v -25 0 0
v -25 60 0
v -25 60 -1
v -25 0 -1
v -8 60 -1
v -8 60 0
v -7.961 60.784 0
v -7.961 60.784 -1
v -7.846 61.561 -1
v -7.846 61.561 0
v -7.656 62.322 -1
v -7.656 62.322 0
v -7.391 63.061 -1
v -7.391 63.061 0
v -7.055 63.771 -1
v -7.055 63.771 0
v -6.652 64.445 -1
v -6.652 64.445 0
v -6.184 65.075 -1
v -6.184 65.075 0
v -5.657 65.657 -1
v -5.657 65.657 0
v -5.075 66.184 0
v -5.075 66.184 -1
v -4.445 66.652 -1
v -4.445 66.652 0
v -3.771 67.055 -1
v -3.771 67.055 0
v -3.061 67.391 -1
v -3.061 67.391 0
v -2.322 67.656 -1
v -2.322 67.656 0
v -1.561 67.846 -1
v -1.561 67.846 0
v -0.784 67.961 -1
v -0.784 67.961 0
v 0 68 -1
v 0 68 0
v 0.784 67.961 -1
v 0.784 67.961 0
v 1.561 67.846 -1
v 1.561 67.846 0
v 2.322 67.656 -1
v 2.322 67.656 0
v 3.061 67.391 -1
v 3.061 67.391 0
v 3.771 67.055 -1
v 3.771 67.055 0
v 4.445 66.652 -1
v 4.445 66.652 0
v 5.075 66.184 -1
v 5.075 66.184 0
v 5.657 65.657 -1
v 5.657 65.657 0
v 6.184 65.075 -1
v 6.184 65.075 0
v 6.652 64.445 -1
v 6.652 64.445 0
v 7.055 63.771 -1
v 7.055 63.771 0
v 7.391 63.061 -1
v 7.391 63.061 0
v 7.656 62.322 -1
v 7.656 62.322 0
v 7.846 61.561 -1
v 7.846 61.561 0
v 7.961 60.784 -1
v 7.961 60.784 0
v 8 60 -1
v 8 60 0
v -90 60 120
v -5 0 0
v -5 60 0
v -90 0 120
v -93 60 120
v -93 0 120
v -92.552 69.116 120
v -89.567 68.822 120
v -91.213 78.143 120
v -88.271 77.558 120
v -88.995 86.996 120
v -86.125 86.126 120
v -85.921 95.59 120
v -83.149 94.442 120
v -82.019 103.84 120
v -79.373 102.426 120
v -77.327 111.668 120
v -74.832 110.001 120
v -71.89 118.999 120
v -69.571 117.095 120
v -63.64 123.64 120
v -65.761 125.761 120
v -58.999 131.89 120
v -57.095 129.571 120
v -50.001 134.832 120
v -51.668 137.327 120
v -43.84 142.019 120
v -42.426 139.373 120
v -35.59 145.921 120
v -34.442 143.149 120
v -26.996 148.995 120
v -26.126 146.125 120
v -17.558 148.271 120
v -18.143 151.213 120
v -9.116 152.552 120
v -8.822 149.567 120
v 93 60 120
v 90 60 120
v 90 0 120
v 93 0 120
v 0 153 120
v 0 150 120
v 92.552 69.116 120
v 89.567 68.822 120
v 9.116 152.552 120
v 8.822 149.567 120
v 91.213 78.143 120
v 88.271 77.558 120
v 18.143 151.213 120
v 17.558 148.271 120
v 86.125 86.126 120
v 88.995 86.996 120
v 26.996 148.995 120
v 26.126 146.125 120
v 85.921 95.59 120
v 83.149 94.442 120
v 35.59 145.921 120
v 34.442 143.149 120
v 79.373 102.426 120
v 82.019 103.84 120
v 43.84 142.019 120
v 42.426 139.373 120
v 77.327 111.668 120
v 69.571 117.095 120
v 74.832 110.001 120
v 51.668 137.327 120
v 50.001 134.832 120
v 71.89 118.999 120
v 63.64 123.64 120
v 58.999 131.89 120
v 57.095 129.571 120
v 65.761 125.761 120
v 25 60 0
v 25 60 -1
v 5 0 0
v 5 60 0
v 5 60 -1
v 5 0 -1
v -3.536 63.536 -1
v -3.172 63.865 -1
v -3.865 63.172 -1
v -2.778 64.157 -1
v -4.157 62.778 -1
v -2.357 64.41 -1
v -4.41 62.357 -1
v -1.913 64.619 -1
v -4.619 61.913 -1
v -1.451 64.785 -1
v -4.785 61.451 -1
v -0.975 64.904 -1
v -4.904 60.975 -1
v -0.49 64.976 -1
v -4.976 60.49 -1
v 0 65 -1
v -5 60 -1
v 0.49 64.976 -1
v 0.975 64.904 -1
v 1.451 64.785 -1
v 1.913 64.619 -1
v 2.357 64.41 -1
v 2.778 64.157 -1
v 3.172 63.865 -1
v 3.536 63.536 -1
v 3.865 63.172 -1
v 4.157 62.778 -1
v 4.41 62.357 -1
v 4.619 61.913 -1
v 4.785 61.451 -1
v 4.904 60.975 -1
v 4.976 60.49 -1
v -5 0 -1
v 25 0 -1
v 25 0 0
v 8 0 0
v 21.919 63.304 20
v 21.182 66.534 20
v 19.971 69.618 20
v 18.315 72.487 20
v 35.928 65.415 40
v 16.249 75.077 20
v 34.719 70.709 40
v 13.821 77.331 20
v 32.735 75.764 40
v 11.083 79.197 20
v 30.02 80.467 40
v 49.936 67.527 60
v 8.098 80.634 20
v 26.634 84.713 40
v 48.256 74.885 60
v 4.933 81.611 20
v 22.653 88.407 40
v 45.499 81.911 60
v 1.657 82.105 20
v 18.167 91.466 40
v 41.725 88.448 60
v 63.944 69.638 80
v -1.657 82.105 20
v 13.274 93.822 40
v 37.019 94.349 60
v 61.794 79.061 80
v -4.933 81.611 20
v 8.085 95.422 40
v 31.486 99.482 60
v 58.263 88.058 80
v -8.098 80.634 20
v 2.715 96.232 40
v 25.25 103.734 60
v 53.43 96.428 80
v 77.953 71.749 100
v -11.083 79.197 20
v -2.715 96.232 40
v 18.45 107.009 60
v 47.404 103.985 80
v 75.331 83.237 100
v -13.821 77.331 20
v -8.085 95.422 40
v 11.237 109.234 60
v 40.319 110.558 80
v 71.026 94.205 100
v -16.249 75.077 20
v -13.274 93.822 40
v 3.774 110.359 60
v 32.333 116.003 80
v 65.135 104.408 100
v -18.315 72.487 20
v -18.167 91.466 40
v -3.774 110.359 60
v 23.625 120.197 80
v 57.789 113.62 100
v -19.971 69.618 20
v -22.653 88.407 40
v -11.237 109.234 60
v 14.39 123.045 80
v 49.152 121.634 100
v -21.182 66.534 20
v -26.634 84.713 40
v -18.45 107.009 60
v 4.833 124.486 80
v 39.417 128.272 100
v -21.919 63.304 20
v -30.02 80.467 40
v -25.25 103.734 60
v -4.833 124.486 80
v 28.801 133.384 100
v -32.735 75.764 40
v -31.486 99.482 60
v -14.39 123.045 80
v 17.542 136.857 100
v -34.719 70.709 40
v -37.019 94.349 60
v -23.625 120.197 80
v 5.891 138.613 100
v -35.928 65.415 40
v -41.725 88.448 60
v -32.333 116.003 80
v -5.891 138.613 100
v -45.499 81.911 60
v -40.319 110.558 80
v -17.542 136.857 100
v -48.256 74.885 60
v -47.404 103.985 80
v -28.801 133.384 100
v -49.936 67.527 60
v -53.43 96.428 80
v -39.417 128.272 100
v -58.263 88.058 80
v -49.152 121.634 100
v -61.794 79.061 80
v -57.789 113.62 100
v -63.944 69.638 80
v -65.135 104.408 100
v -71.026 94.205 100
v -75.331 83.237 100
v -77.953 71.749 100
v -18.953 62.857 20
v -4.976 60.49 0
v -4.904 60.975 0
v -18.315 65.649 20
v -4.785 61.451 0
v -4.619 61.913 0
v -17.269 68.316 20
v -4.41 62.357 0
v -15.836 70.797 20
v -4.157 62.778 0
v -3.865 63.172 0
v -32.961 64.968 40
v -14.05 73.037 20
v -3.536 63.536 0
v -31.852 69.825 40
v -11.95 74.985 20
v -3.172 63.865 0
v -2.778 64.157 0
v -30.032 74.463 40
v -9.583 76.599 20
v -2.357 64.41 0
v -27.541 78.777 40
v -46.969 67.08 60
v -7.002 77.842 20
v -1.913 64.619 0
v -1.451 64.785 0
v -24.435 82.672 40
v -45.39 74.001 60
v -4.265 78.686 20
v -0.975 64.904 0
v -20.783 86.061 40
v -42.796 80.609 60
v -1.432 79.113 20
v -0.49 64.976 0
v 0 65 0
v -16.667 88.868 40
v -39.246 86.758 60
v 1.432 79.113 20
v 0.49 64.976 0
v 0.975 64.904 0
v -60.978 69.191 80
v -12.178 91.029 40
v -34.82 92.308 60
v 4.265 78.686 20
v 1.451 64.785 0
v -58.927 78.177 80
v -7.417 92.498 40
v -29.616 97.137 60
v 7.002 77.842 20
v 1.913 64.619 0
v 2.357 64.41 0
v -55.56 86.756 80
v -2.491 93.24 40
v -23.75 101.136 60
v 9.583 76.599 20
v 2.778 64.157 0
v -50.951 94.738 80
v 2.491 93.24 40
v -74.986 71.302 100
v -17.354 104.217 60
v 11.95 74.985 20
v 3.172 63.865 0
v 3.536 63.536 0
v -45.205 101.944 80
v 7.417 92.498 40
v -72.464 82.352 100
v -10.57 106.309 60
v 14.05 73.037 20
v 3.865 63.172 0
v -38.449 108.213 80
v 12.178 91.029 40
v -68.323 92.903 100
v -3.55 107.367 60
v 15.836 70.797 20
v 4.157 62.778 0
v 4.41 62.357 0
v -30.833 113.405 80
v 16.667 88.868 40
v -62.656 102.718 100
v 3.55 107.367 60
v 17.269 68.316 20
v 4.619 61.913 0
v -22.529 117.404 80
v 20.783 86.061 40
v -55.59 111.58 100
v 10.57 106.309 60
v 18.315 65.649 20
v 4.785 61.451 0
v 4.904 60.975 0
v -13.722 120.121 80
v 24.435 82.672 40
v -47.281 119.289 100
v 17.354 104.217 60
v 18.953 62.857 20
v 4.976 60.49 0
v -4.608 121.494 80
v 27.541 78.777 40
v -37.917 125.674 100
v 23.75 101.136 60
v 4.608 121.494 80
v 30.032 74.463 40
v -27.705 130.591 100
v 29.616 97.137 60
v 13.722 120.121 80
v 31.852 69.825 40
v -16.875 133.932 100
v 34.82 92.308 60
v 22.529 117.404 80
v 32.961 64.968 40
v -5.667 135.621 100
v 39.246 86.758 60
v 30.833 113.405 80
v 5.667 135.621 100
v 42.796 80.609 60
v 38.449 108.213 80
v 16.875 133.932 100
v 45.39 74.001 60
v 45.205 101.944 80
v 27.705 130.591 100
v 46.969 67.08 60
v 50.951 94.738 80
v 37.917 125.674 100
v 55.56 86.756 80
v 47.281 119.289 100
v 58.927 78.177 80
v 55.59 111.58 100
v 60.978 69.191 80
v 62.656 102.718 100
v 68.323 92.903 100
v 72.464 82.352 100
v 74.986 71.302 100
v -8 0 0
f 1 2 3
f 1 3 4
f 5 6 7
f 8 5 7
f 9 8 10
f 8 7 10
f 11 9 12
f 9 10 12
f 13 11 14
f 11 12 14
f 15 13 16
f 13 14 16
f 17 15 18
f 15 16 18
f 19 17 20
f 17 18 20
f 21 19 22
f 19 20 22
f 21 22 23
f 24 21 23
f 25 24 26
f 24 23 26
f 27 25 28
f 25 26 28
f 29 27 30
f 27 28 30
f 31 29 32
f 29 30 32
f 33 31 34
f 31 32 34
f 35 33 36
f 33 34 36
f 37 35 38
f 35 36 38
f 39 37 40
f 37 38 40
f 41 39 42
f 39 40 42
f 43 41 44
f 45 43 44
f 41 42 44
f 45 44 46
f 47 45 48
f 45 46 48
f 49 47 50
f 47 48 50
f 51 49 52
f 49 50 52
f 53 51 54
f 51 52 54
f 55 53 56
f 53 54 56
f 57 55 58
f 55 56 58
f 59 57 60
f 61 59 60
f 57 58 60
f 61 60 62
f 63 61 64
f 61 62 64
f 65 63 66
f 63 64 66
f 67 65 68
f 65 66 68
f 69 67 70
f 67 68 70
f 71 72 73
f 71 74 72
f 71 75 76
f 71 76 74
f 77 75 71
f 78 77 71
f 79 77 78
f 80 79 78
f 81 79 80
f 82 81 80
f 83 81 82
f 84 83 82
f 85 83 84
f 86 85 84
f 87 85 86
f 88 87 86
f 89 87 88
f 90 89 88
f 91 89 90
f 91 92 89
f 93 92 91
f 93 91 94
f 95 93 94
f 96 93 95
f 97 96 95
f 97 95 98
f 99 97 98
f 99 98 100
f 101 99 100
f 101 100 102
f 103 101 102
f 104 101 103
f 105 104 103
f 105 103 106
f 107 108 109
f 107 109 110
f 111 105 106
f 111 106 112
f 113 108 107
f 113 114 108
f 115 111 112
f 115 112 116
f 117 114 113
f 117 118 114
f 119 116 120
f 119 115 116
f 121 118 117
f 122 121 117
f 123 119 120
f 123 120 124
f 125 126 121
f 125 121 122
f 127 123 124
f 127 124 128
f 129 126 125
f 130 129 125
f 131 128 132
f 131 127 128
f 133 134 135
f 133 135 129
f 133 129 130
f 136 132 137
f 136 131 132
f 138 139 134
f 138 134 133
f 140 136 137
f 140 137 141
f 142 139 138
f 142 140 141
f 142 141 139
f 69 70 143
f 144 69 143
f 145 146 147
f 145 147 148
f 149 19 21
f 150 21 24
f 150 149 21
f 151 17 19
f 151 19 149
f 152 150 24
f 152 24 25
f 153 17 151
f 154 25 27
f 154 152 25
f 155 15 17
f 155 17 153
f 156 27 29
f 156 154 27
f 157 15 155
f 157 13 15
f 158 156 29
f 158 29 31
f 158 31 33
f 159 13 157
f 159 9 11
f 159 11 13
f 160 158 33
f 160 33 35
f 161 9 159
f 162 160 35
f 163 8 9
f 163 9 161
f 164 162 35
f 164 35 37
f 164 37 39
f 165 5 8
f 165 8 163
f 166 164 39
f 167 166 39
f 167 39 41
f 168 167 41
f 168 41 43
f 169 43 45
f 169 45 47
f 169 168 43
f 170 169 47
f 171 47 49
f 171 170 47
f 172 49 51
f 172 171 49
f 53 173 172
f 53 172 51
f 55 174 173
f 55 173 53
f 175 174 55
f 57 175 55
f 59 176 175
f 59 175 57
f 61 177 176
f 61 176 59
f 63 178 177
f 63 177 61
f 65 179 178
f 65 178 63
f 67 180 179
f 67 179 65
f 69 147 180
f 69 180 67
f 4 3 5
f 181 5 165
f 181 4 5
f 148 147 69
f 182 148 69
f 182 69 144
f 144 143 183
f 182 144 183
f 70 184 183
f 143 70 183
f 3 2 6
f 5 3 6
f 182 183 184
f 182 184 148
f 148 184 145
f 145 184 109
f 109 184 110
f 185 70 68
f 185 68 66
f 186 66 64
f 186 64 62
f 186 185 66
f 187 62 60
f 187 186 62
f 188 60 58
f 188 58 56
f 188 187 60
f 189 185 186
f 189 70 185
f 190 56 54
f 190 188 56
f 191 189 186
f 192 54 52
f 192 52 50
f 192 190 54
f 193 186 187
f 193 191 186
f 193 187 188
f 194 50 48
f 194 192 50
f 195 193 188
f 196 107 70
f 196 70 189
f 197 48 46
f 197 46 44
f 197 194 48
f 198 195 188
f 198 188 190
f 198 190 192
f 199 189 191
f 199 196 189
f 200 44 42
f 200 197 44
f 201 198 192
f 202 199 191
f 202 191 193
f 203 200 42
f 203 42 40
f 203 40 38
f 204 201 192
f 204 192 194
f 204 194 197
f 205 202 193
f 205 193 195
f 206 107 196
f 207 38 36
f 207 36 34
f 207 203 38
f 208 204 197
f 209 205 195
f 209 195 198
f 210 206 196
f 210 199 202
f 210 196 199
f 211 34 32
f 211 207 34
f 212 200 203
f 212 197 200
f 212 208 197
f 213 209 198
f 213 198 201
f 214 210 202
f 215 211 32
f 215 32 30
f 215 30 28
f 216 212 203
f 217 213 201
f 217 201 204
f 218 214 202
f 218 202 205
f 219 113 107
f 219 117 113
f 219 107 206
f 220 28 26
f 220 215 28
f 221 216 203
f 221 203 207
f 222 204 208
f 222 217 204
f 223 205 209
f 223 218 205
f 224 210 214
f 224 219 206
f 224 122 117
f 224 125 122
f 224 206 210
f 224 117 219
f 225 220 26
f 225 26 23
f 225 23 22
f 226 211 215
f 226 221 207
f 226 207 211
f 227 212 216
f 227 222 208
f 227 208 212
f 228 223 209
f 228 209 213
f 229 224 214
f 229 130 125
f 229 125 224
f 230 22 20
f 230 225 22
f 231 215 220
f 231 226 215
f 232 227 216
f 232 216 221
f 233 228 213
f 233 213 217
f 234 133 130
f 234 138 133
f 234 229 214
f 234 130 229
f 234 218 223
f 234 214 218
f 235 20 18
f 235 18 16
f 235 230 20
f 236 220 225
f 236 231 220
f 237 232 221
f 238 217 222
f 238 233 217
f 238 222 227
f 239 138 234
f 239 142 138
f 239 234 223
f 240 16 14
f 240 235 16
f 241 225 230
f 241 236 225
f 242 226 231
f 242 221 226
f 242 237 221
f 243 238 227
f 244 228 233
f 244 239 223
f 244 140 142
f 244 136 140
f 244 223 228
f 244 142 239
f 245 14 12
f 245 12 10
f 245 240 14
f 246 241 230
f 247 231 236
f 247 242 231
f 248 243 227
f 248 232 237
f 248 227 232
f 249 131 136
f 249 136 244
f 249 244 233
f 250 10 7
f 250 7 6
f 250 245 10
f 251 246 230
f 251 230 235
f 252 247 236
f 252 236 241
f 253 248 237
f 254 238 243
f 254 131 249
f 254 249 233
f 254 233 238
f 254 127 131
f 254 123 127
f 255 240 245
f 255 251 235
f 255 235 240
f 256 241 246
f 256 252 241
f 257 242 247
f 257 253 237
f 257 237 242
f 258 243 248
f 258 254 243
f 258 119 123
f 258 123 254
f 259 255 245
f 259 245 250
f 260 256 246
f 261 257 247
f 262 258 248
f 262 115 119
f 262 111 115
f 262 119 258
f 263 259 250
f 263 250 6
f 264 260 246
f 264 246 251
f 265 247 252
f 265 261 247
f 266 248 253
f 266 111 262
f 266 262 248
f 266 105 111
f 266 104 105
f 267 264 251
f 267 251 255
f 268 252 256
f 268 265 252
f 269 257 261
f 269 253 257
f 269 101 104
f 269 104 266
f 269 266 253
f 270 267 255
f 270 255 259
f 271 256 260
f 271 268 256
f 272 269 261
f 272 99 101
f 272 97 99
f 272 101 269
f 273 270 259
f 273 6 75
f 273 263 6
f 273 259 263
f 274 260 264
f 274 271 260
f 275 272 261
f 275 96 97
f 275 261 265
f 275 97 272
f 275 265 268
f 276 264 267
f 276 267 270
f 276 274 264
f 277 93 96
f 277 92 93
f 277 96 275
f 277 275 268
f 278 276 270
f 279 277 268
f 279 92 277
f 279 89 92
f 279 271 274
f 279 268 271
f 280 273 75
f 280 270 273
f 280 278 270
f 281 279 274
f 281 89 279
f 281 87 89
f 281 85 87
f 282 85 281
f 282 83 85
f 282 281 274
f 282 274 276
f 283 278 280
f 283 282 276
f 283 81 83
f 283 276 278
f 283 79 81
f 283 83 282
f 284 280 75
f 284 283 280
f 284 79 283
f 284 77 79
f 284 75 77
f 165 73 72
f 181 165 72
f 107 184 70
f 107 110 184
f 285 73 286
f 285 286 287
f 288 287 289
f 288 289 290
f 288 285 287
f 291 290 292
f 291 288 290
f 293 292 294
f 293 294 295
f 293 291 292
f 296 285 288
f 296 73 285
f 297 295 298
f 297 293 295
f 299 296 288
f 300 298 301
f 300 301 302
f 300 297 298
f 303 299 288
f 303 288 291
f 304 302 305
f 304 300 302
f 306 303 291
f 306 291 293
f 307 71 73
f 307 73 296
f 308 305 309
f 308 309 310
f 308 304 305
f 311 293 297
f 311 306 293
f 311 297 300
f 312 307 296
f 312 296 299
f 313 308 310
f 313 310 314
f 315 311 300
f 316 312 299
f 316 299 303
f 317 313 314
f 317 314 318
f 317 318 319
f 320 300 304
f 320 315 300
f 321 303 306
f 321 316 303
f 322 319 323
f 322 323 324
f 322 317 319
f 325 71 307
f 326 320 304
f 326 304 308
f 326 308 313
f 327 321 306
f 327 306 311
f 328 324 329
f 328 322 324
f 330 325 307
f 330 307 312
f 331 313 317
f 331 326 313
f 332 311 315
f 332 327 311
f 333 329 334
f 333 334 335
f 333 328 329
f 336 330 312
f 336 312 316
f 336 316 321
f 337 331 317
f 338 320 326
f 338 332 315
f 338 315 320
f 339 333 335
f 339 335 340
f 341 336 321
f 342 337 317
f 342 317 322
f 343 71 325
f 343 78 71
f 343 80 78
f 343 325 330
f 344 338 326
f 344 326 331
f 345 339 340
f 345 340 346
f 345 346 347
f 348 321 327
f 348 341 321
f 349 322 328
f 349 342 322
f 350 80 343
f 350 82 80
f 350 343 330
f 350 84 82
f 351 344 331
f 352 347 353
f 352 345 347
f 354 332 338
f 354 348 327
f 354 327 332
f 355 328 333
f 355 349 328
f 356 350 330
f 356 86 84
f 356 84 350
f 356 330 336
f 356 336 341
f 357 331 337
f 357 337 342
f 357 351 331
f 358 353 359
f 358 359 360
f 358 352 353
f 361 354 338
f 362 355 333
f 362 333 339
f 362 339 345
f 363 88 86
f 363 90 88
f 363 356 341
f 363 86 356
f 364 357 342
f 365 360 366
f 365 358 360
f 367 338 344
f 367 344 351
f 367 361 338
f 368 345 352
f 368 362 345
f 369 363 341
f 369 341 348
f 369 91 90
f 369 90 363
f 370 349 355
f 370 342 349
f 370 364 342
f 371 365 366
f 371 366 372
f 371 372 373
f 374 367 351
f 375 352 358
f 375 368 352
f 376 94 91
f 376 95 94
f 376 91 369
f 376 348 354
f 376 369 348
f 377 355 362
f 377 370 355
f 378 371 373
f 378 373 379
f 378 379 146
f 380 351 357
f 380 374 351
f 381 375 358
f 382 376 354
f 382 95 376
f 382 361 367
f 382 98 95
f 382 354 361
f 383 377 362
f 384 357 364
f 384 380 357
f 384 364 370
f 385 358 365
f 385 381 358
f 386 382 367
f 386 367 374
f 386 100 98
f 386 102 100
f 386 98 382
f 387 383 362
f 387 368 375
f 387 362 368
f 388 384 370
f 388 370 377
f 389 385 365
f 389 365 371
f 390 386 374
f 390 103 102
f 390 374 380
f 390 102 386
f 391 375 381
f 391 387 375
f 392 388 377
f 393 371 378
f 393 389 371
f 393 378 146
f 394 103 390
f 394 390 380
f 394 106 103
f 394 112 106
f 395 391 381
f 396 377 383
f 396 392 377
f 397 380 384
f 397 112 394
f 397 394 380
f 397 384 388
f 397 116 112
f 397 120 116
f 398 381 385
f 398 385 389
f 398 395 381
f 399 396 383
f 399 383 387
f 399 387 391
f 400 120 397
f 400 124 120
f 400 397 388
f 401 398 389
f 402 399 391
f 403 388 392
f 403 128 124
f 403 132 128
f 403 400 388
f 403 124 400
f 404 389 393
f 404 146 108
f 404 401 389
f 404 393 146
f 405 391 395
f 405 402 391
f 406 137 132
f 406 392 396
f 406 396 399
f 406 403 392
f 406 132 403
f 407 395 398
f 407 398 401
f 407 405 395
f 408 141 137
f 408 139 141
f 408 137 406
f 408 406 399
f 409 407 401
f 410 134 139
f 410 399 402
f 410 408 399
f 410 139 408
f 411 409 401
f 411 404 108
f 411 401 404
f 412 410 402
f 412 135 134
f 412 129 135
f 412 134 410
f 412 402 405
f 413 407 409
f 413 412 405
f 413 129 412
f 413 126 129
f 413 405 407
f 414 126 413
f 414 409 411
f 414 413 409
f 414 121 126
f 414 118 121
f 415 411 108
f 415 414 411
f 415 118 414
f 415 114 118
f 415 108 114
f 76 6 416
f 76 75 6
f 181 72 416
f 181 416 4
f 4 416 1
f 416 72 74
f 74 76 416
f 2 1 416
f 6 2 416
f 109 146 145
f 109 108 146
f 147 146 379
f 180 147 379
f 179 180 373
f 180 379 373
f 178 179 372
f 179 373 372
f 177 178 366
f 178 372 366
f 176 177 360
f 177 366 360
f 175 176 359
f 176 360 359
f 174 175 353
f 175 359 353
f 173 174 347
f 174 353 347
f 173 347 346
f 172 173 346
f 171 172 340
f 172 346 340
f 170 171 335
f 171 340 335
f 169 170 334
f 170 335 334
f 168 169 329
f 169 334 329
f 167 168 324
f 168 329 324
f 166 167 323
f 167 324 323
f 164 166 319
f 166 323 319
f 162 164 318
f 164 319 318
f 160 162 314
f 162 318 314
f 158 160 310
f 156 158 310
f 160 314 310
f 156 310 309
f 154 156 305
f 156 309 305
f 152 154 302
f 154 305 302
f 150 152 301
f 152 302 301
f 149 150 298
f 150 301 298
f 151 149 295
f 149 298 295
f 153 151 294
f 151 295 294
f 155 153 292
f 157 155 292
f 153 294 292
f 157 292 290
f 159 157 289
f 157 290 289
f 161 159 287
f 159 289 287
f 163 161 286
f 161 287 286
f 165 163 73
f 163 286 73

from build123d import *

# Parameters (mm, degrees)
F4_W     = 17
F4_H     = 60
F4_W_2   = 3
F5_DEPTH = 1


with BuildPart() as f3:
    # F0 (on Top) → F3 section 0
    with BuildSketch(Plane.XY):
        with BuildLine():
            Line((5, 60), (5, 0))
            Line((5, 0), (8, 0))
            Line((8, 0), (8, 60))
            ThreePointArc((8, 60), (0, 68), (-8, 60))
            Line((-8, 60), (-8, 0))
            Line((-8, 0), (-5, 0))
            Line((-5, 0), (-5, 60))
            ThreePointArc((-5, 60), (0, 65), (5, 60))
        make_face()
    # F2 (on offset) → F3 section 1
    with BuildSketch(Plane.XY.offset(120)):
        with BuildLine():
            Line((-90, 0), (-90, 60))
            ThreePointArc((-90, 60), (0, 150), (90, 60))
            Line((90, 60), (90, 0))
            Line((90, 0), (93, 0))
            Line((93, 0), (93, 60))
            ThreePointArc((93, 60), (0, 153), (-93, 60))
            Line((-93, 60), (-93, 0))
            Line((-93, 0), (-90, 0))
        make_face()
    loft()

    # F4 (on face) → F5 (join)
    with BuildSketch(Plane(origin=(0, 0, 0), x_dir=(1, 0, 0), z_dir=(0, 0, -1))):
        with BuildLine():
            ThreePointArc((5, -60), (0, -65), (-5, -60))
            Line((-5, -60), (-8, -60))
            ThreePointArc((-8, -60), (0, -68), (8, -60))
            Line((8, -60), (5, -60))
        make_face()
        with Locations((-16.5, -30)):
            Rectangle(F4_W, F4_H)
        with Locations((16.5, -30)):
            Rectangle(F4_W, F4_H)
        with Locations((6.5, -30)):
            Rectangle(F4_W_2, F4_H)
        with Locations((-6.5, -30)):
            Rectangle(F4_W_2, F4_H)
    extrude(amount=F5_DEPTH)


solid = f3.part
